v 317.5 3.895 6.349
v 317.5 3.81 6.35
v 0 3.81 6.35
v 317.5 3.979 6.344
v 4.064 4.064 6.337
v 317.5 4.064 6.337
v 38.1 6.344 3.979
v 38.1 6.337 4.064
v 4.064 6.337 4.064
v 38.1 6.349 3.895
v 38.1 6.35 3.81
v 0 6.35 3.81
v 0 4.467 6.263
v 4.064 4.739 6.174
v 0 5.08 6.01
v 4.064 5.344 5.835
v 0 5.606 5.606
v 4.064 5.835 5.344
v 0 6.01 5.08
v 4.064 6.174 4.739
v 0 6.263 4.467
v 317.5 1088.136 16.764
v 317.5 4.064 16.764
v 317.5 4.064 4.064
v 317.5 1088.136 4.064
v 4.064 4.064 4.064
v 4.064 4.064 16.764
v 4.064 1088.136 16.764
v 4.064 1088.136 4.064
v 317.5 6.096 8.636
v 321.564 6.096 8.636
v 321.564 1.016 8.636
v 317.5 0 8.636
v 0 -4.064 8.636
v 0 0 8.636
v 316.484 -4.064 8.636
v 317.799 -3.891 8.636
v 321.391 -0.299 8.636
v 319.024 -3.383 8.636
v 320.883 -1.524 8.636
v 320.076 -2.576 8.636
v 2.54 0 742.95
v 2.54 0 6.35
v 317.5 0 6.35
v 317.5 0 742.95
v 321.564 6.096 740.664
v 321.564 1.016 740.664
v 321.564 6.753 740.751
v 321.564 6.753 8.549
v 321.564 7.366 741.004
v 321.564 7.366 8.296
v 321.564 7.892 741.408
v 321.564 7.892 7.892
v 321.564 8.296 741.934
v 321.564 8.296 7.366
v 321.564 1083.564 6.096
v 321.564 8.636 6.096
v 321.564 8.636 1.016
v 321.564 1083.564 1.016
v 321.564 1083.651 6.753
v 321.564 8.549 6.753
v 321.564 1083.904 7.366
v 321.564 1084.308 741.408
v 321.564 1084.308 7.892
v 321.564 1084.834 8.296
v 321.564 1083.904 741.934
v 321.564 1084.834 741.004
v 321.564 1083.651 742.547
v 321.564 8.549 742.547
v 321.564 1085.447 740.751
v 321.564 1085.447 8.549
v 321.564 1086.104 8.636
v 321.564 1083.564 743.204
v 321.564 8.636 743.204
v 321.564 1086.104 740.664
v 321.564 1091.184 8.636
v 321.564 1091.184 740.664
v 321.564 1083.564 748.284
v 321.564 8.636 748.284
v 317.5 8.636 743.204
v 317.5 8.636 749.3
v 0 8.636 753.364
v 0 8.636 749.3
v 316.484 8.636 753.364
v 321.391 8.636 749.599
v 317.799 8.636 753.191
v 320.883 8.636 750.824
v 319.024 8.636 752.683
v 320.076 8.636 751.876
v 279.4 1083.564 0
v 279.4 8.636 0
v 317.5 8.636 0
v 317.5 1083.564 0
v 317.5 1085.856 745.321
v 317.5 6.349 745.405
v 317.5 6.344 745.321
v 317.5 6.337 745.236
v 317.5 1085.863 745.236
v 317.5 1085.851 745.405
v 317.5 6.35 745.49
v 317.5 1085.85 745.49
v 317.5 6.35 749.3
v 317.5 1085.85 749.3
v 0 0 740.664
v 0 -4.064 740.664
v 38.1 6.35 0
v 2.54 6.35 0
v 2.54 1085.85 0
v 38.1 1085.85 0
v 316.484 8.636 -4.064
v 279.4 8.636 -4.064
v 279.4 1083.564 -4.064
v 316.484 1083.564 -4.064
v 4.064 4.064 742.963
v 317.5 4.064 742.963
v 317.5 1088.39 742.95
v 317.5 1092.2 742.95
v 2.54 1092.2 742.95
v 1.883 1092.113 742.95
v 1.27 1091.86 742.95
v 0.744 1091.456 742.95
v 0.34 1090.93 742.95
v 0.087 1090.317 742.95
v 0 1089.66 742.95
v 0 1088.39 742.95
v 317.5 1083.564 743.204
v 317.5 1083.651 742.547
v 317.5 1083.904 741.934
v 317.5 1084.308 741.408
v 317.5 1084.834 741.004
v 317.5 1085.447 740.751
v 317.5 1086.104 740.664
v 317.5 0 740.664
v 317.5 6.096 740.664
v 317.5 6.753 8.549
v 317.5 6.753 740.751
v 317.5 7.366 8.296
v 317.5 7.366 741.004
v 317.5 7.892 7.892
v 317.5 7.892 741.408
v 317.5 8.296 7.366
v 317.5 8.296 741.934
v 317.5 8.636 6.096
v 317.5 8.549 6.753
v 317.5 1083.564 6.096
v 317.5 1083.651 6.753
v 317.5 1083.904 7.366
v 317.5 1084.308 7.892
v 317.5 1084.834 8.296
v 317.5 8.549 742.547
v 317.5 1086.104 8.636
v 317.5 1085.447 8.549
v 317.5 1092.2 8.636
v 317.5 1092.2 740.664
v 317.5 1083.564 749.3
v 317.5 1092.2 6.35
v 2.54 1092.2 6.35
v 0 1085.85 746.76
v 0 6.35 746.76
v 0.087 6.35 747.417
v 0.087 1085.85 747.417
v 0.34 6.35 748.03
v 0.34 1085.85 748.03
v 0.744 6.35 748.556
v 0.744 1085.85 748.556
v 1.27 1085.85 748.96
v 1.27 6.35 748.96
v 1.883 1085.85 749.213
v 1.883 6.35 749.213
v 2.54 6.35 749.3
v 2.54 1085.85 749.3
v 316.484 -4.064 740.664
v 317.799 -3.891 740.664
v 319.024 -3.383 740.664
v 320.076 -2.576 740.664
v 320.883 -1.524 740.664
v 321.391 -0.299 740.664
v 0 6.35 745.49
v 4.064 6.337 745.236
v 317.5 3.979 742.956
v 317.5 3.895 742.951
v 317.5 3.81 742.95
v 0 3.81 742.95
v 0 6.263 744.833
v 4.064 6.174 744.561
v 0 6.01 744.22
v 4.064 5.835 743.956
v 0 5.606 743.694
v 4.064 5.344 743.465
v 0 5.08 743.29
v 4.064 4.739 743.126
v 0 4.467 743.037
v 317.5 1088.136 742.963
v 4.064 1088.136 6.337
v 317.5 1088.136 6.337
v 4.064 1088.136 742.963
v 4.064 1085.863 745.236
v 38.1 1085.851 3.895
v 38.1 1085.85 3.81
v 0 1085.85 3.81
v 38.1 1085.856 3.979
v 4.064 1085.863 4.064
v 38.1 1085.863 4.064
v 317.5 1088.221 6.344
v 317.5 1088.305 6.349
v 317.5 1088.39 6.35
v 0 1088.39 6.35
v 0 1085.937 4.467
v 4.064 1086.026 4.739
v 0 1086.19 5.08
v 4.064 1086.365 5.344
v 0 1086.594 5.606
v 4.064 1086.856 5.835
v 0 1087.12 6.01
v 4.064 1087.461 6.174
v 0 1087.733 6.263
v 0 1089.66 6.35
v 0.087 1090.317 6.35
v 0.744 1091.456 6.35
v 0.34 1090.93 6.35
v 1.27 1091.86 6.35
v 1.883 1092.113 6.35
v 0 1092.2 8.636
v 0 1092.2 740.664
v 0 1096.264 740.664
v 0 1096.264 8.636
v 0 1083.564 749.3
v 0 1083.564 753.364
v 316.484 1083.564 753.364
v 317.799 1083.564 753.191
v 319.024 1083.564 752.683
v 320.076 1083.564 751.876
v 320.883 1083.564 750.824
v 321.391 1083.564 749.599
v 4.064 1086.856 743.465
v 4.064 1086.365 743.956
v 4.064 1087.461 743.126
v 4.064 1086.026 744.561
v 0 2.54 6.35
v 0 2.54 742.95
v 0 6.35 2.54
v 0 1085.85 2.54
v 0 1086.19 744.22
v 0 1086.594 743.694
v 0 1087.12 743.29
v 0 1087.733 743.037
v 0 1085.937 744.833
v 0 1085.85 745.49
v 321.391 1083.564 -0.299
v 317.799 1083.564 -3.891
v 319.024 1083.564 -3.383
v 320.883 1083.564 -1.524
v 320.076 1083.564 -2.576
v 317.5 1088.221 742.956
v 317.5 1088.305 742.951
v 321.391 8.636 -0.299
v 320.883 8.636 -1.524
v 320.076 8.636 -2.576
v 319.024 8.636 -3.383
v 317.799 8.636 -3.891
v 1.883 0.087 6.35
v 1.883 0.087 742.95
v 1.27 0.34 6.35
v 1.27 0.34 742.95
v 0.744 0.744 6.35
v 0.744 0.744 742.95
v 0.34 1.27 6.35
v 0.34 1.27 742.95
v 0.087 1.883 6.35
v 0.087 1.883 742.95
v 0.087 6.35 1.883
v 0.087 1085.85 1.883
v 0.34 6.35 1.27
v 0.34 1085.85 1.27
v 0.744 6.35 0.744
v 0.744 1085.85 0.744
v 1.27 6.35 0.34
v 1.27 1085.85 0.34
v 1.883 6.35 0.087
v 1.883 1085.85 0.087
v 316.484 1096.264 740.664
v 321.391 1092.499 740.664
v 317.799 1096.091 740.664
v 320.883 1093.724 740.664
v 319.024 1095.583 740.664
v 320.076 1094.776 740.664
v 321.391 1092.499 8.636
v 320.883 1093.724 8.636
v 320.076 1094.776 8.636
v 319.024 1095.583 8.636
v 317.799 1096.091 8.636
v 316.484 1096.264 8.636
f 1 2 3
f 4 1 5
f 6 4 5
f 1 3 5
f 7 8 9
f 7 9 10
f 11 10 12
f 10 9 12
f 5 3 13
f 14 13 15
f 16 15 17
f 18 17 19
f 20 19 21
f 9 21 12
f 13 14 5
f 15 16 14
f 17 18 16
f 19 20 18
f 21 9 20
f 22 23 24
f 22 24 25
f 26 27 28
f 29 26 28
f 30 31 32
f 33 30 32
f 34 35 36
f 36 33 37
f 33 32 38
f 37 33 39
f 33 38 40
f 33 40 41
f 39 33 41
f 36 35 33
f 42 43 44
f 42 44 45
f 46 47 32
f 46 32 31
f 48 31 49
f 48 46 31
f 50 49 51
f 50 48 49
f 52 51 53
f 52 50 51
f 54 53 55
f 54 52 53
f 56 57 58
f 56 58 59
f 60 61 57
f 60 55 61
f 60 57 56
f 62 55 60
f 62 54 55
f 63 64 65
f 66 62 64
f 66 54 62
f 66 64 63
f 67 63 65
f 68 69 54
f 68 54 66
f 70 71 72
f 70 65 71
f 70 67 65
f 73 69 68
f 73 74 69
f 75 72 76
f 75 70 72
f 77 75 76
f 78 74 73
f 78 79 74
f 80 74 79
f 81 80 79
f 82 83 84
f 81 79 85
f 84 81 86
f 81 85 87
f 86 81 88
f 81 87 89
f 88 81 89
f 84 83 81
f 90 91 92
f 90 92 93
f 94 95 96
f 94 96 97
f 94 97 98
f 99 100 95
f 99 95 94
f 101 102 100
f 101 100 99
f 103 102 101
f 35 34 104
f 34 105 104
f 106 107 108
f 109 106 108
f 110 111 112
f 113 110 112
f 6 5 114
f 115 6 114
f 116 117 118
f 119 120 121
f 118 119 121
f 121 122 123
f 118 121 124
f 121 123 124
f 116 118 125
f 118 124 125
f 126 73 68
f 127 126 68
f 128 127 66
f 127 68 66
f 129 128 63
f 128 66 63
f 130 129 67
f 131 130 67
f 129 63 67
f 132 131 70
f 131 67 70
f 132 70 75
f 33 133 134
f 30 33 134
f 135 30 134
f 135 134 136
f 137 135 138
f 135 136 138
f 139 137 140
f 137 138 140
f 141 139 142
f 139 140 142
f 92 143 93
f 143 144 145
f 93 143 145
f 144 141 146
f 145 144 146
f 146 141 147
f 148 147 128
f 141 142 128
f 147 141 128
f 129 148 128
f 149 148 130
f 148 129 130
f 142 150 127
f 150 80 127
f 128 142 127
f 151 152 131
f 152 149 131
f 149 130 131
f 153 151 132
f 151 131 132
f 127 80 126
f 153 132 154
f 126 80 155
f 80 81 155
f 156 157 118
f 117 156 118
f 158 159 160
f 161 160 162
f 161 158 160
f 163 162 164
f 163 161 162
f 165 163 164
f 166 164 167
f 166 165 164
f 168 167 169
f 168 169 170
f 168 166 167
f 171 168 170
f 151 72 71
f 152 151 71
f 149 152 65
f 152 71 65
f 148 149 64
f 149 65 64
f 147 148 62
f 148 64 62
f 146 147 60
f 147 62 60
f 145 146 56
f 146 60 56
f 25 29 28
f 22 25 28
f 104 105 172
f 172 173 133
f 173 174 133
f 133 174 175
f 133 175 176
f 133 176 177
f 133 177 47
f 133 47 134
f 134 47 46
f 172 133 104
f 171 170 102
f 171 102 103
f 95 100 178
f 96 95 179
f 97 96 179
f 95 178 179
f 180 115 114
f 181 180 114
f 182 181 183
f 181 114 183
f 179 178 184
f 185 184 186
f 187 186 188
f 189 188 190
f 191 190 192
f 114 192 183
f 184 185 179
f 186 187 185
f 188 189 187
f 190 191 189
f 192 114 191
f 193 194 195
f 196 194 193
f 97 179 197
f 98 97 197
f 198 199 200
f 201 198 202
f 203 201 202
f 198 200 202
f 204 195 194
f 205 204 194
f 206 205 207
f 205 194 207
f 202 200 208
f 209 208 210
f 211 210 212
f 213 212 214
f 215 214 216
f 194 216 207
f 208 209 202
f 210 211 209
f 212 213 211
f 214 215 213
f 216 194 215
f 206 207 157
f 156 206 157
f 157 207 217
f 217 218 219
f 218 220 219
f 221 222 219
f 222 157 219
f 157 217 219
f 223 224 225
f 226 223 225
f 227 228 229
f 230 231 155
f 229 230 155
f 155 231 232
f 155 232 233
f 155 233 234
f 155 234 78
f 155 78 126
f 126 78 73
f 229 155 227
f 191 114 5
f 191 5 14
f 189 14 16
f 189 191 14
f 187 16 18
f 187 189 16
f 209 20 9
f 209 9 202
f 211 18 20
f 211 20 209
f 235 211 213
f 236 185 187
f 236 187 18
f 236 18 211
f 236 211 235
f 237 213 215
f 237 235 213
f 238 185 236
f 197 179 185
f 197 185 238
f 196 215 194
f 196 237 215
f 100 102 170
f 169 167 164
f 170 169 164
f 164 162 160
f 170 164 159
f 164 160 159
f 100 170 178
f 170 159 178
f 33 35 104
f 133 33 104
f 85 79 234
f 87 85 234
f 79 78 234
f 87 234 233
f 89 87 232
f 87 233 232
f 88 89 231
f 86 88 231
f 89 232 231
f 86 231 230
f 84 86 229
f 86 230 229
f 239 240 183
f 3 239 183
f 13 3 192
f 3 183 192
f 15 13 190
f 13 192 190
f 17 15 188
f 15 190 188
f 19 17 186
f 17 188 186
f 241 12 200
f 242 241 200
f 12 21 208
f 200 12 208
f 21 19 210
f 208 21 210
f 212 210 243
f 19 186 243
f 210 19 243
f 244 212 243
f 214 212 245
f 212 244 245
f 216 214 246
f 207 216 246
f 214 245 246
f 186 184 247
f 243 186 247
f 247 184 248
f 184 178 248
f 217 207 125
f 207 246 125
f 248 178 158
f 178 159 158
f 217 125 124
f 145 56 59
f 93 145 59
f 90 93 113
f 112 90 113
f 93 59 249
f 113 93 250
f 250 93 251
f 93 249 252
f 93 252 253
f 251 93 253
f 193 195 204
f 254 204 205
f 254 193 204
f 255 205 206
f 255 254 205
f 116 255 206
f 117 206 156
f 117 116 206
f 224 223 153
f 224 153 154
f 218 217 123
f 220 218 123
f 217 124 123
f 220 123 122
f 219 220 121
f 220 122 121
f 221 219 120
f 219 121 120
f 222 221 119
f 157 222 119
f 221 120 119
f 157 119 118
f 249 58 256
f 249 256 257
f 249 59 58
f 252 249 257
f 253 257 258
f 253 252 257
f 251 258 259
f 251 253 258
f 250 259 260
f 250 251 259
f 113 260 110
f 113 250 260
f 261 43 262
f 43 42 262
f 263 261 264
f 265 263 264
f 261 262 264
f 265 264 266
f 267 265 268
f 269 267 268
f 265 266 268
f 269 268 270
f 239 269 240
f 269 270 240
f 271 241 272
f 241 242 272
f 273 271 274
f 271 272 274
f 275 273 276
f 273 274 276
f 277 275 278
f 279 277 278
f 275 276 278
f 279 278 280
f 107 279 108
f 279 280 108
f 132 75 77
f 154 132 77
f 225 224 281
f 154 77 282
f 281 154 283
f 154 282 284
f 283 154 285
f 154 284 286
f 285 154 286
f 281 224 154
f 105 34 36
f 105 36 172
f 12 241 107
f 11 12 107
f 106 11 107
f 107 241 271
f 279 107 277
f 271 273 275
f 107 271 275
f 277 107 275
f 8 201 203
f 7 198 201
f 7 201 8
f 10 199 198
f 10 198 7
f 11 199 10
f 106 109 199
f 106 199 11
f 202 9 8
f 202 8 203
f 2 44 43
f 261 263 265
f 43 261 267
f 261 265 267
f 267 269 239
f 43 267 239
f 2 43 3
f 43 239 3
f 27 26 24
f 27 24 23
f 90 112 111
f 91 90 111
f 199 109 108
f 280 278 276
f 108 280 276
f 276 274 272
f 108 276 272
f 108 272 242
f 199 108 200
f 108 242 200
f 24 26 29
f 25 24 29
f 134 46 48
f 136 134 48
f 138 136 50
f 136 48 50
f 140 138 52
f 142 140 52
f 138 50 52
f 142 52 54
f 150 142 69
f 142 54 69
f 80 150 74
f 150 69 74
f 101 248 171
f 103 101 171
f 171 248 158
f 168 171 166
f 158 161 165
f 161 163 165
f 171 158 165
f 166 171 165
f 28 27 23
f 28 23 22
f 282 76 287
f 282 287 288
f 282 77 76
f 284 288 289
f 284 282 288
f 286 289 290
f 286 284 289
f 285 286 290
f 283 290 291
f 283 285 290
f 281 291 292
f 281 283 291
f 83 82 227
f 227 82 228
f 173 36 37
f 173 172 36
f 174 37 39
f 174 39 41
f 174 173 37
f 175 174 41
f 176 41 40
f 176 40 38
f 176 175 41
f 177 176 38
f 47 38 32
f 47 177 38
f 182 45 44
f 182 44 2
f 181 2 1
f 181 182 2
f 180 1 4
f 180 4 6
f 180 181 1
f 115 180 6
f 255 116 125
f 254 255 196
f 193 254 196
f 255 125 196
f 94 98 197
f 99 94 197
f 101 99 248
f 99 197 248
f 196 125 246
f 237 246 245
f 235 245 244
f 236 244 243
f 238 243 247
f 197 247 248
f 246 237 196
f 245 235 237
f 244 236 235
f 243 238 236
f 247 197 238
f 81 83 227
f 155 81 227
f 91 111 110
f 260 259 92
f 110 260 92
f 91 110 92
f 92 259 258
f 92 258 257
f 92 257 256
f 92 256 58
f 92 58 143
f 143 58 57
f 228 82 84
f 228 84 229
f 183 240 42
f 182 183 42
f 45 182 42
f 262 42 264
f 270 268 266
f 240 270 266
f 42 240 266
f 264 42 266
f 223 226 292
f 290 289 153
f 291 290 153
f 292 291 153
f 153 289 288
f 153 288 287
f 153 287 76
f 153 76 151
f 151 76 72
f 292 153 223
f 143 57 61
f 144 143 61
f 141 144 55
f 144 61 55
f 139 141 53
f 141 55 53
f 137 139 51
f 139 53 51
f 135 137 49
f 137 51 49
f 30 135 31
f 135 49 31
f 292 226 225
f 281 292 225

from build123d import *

# Parameters (mm, degrees)
F0_W      = 1092.2
F0_H      = 749.3
F1_DEPTH  = 317.5
F2_T      = -4.064
F3_W      = 279.4
F3_H      = 1717.7925925926
F4_DEPTH  = 4.064
F6_DEPTH  = 317.501
F7_R      = 2.54
F8_W      = 1084.072
F8_H      = 12.7
F9_DEPTH  = 313.436
F10_DEPTH = 317.5
F11_T     = 4.064
F13_DEPTH = 321.565
F14_R     = 5.08
F15_W     = 279.4
F15_H     = 1074.928
F16_DEPTH = 25.4


with BuildPart() as f1:
    # F0 (on Right) → F1 (new body)
    with BuildSketch(Plane.YZ):
        with Locations((546.1, 374.65)):
            Rectangle(F0_W, F0_H)
    extrude(amount=F1_DEPTH)

    # F2
    f2_openings = [f1.faces().sort_by_distance(p)[0] for p in [
        (317.5, 546.1, 374.65),
    ]]
    offset(amount=F2_T, openings=f2_openings)

    # F3 (on face) → F4 (cut)
    with BuildSketch(Plane(origin=(0, 0, 0), x_dir=(1, 0, 0), z_dir=(0, 0, -1))):
        with Locations((177.8, -858.8962962963)):
            Rectangle(F3_W, F3_H)
    extrude(amount=-F4_DEPTH, mode=Mode.SUBTRACT)

    # F5 (on face) → F6 (cut, through all)
    with BuildSketch(Plane(origin=(0, 0, 0), x_dir=(0, -1, 0), z_dir=(-1, 0, 0))):
        with BuildLine():
            Line((-1092.2, 6.35), (-1092.2, 0))
            Line((-1092.2, 0), (-1085.85, 0))
            Line((-1085.85, 0), (-1085.85, 3.81))
            ThreePointArc((-1085.85, 3.81), (-1086.5939487758, 5.6060512242), (-1088.39, 6.35))
            Line((-1088.39, 6.35), (-1092.2, 6.35))
        make_face()
        with BuildLine():
            Line((-1085.85, 749.3), (-1092.2, 749.3))
            Line((-1092.2, 749.3), (-1092.2, 742.95))
            Line((-1092.2, 742.95), (-1088.39, 742.95))
            ThreePointArc((-1088.39, 742.95), (-1086.5939487758, 743.6939487758), (-1085.85, 745.49))
            Line((-1085.85, 745.49), (-1085.85, 749.3))
        make_face()
        with BuildLine():
            Line((0, 742.95), (0, 749.3))
            Line((0, 749.3), (-6.35, 749.3))
            Line((-6.35, 749.3), (-6.35, 745.49))
            ThreePointArc((-6.35, 745.49), (-5.6060512242, 743.6939487758), (-3.81, 742.95))
            Line((-3.81, 742.95), (0, 742.95))
        make_face()
        with BuildLine():
            Line((-6.35, 0), (0, 0))
            Line((0, 0), (0, 6.35))
            Line((0, 6.35), (-3.81, 6.35))
            ThreePointArc((-3.81, 6.35), (-5.6060512242, 5.6060512242), (-6.35, 3.81))
            Line((-6.35, 3.81), (-6.35, 0))
        make_face()
    extrude(amount=-F6_DEPTH, mode=Mode.SUBTRACT)

    # F7
    f7_edges = [f1.edges().sort_by_distance(p)[0] for p in [
        (0, 1092.2, 374.65),
        (0, 546.1, 0),
        (0, 0, 374.65),
        (0, 546.1, 749.3),
    ]]
    fillet(f7_edges, radius=F7_R)


with BuildPart() as f9:
    # F8 (on face) → F9 (new body, through all)
    with BuildSketch(Plane.YZ.offset(4.064)):
        with Locations((546.1, 10.414)):
            Rectangle(F8_W, F8_H)
    extrude(amount=F9_DEPTH)


with BuildPart() as f10:
    # F0 (on Right) → F10 (new body)
    with BuildSketch(Plane.YZ):
        with Locations((546.1, 374.65)):
            Rectangle(F0_W, F0_H)
    extrude(amount=F10_DEPTH)

    # F11
    f11_openings = [f10.faces().sort_by_distance(p)[0] for p in [
        (0, 546.1, 374.65),
    ]]
    offset(amount=F11_T, openings=f11_openings, kind=Kind.INTERSECTION)

    # F12 (on face) → F13 (cut, through all)
    with BuildSketch(Plane.YZ.offset(321.564)):
        with BuildLine():
            Line((1083.564, -4.064), (1096.264, -4.064))
            Line((1096.264, -4.064), (1096.264, 8.636))
            Line((1096.264, 8.636), (1086.104, 8.636))
            ThreePointArc((1086.104, 8.636), (1084.3079487758, 7.8920512242), (1083.564, 6.096))
            Line((1083.564, 6.096), (1083.564, -4.064))
        make_face()
        with BuildLine():
            Line((8.636, 753.364), (-4.064, 753.364))
            Line((-4.064, 753.364), (-4.064, 740.664))
            Line((-4.064, 740.664), (6.096, 740.664))
            ThreePointArc((6.096, 740.664), (7.8920512242, 741.4079487758), (8.636, 743.204))
            Line((8.636, 743.204), (8.636, 753.364))
        make_face()
        with BuildLine():
            Line((1096.264, 740.664), (1096.264, 753.364))
            Line((1096.264, 753.364), (1083.564, 753.364))
            Line((1083.564, 753.364), (1083.564, 743.204))
            ThreePointArc((1083.564, 743.204), (1084.3079487758, 741.4079487758), (1086.104, 740.664))
            Line((1086.104, 740.664), (1096.264, 740.664))
        make_face()
        with BuildLine():
            Line((-4.064, 8.636), (-4.064, -4.064))
            Line((-4.064, -4.064), (8.636, -4.064))
            Line((8.636, -4.064), (8.636, 6.096))
            ThreePointArc((8.636, 6.096), (7.8920512242, 7.8920512242), (6.096, 8.636))
            Line((6.096, 8.636), (-4.064, 8.636))
        make_face()
    extrude(amount=-F13_DEPTH, mode=Mode.SUBTRACT)

    # F14
    f14_edges = [f10.edges().sort_by_distance(p)[0] for p in [
        (321.564, -4.064, 374.65),
        (321.564, 1096.264, 374.65),
        (321.564, 546.1, -4.064),
        (321.564, 546.1, 753.364),
    ]]
    fillet(f14_edges, radius=F14_R)

    # F15 (on face) → F16 (cut)
    with BuildSketch(Plane(origin=(0, 0, -4.064), x_dir=(1, 0, 0), z_dir=(0, 0, -1))):
        with Locations((139.7, -546.1)):
            Rectangle(F15_W, F15_H)
    extrude(amount=-F16_DEPTH, mode=Mode.SUBTRACT)


solid = Compound([f1.part, f9.part, f10.part])
